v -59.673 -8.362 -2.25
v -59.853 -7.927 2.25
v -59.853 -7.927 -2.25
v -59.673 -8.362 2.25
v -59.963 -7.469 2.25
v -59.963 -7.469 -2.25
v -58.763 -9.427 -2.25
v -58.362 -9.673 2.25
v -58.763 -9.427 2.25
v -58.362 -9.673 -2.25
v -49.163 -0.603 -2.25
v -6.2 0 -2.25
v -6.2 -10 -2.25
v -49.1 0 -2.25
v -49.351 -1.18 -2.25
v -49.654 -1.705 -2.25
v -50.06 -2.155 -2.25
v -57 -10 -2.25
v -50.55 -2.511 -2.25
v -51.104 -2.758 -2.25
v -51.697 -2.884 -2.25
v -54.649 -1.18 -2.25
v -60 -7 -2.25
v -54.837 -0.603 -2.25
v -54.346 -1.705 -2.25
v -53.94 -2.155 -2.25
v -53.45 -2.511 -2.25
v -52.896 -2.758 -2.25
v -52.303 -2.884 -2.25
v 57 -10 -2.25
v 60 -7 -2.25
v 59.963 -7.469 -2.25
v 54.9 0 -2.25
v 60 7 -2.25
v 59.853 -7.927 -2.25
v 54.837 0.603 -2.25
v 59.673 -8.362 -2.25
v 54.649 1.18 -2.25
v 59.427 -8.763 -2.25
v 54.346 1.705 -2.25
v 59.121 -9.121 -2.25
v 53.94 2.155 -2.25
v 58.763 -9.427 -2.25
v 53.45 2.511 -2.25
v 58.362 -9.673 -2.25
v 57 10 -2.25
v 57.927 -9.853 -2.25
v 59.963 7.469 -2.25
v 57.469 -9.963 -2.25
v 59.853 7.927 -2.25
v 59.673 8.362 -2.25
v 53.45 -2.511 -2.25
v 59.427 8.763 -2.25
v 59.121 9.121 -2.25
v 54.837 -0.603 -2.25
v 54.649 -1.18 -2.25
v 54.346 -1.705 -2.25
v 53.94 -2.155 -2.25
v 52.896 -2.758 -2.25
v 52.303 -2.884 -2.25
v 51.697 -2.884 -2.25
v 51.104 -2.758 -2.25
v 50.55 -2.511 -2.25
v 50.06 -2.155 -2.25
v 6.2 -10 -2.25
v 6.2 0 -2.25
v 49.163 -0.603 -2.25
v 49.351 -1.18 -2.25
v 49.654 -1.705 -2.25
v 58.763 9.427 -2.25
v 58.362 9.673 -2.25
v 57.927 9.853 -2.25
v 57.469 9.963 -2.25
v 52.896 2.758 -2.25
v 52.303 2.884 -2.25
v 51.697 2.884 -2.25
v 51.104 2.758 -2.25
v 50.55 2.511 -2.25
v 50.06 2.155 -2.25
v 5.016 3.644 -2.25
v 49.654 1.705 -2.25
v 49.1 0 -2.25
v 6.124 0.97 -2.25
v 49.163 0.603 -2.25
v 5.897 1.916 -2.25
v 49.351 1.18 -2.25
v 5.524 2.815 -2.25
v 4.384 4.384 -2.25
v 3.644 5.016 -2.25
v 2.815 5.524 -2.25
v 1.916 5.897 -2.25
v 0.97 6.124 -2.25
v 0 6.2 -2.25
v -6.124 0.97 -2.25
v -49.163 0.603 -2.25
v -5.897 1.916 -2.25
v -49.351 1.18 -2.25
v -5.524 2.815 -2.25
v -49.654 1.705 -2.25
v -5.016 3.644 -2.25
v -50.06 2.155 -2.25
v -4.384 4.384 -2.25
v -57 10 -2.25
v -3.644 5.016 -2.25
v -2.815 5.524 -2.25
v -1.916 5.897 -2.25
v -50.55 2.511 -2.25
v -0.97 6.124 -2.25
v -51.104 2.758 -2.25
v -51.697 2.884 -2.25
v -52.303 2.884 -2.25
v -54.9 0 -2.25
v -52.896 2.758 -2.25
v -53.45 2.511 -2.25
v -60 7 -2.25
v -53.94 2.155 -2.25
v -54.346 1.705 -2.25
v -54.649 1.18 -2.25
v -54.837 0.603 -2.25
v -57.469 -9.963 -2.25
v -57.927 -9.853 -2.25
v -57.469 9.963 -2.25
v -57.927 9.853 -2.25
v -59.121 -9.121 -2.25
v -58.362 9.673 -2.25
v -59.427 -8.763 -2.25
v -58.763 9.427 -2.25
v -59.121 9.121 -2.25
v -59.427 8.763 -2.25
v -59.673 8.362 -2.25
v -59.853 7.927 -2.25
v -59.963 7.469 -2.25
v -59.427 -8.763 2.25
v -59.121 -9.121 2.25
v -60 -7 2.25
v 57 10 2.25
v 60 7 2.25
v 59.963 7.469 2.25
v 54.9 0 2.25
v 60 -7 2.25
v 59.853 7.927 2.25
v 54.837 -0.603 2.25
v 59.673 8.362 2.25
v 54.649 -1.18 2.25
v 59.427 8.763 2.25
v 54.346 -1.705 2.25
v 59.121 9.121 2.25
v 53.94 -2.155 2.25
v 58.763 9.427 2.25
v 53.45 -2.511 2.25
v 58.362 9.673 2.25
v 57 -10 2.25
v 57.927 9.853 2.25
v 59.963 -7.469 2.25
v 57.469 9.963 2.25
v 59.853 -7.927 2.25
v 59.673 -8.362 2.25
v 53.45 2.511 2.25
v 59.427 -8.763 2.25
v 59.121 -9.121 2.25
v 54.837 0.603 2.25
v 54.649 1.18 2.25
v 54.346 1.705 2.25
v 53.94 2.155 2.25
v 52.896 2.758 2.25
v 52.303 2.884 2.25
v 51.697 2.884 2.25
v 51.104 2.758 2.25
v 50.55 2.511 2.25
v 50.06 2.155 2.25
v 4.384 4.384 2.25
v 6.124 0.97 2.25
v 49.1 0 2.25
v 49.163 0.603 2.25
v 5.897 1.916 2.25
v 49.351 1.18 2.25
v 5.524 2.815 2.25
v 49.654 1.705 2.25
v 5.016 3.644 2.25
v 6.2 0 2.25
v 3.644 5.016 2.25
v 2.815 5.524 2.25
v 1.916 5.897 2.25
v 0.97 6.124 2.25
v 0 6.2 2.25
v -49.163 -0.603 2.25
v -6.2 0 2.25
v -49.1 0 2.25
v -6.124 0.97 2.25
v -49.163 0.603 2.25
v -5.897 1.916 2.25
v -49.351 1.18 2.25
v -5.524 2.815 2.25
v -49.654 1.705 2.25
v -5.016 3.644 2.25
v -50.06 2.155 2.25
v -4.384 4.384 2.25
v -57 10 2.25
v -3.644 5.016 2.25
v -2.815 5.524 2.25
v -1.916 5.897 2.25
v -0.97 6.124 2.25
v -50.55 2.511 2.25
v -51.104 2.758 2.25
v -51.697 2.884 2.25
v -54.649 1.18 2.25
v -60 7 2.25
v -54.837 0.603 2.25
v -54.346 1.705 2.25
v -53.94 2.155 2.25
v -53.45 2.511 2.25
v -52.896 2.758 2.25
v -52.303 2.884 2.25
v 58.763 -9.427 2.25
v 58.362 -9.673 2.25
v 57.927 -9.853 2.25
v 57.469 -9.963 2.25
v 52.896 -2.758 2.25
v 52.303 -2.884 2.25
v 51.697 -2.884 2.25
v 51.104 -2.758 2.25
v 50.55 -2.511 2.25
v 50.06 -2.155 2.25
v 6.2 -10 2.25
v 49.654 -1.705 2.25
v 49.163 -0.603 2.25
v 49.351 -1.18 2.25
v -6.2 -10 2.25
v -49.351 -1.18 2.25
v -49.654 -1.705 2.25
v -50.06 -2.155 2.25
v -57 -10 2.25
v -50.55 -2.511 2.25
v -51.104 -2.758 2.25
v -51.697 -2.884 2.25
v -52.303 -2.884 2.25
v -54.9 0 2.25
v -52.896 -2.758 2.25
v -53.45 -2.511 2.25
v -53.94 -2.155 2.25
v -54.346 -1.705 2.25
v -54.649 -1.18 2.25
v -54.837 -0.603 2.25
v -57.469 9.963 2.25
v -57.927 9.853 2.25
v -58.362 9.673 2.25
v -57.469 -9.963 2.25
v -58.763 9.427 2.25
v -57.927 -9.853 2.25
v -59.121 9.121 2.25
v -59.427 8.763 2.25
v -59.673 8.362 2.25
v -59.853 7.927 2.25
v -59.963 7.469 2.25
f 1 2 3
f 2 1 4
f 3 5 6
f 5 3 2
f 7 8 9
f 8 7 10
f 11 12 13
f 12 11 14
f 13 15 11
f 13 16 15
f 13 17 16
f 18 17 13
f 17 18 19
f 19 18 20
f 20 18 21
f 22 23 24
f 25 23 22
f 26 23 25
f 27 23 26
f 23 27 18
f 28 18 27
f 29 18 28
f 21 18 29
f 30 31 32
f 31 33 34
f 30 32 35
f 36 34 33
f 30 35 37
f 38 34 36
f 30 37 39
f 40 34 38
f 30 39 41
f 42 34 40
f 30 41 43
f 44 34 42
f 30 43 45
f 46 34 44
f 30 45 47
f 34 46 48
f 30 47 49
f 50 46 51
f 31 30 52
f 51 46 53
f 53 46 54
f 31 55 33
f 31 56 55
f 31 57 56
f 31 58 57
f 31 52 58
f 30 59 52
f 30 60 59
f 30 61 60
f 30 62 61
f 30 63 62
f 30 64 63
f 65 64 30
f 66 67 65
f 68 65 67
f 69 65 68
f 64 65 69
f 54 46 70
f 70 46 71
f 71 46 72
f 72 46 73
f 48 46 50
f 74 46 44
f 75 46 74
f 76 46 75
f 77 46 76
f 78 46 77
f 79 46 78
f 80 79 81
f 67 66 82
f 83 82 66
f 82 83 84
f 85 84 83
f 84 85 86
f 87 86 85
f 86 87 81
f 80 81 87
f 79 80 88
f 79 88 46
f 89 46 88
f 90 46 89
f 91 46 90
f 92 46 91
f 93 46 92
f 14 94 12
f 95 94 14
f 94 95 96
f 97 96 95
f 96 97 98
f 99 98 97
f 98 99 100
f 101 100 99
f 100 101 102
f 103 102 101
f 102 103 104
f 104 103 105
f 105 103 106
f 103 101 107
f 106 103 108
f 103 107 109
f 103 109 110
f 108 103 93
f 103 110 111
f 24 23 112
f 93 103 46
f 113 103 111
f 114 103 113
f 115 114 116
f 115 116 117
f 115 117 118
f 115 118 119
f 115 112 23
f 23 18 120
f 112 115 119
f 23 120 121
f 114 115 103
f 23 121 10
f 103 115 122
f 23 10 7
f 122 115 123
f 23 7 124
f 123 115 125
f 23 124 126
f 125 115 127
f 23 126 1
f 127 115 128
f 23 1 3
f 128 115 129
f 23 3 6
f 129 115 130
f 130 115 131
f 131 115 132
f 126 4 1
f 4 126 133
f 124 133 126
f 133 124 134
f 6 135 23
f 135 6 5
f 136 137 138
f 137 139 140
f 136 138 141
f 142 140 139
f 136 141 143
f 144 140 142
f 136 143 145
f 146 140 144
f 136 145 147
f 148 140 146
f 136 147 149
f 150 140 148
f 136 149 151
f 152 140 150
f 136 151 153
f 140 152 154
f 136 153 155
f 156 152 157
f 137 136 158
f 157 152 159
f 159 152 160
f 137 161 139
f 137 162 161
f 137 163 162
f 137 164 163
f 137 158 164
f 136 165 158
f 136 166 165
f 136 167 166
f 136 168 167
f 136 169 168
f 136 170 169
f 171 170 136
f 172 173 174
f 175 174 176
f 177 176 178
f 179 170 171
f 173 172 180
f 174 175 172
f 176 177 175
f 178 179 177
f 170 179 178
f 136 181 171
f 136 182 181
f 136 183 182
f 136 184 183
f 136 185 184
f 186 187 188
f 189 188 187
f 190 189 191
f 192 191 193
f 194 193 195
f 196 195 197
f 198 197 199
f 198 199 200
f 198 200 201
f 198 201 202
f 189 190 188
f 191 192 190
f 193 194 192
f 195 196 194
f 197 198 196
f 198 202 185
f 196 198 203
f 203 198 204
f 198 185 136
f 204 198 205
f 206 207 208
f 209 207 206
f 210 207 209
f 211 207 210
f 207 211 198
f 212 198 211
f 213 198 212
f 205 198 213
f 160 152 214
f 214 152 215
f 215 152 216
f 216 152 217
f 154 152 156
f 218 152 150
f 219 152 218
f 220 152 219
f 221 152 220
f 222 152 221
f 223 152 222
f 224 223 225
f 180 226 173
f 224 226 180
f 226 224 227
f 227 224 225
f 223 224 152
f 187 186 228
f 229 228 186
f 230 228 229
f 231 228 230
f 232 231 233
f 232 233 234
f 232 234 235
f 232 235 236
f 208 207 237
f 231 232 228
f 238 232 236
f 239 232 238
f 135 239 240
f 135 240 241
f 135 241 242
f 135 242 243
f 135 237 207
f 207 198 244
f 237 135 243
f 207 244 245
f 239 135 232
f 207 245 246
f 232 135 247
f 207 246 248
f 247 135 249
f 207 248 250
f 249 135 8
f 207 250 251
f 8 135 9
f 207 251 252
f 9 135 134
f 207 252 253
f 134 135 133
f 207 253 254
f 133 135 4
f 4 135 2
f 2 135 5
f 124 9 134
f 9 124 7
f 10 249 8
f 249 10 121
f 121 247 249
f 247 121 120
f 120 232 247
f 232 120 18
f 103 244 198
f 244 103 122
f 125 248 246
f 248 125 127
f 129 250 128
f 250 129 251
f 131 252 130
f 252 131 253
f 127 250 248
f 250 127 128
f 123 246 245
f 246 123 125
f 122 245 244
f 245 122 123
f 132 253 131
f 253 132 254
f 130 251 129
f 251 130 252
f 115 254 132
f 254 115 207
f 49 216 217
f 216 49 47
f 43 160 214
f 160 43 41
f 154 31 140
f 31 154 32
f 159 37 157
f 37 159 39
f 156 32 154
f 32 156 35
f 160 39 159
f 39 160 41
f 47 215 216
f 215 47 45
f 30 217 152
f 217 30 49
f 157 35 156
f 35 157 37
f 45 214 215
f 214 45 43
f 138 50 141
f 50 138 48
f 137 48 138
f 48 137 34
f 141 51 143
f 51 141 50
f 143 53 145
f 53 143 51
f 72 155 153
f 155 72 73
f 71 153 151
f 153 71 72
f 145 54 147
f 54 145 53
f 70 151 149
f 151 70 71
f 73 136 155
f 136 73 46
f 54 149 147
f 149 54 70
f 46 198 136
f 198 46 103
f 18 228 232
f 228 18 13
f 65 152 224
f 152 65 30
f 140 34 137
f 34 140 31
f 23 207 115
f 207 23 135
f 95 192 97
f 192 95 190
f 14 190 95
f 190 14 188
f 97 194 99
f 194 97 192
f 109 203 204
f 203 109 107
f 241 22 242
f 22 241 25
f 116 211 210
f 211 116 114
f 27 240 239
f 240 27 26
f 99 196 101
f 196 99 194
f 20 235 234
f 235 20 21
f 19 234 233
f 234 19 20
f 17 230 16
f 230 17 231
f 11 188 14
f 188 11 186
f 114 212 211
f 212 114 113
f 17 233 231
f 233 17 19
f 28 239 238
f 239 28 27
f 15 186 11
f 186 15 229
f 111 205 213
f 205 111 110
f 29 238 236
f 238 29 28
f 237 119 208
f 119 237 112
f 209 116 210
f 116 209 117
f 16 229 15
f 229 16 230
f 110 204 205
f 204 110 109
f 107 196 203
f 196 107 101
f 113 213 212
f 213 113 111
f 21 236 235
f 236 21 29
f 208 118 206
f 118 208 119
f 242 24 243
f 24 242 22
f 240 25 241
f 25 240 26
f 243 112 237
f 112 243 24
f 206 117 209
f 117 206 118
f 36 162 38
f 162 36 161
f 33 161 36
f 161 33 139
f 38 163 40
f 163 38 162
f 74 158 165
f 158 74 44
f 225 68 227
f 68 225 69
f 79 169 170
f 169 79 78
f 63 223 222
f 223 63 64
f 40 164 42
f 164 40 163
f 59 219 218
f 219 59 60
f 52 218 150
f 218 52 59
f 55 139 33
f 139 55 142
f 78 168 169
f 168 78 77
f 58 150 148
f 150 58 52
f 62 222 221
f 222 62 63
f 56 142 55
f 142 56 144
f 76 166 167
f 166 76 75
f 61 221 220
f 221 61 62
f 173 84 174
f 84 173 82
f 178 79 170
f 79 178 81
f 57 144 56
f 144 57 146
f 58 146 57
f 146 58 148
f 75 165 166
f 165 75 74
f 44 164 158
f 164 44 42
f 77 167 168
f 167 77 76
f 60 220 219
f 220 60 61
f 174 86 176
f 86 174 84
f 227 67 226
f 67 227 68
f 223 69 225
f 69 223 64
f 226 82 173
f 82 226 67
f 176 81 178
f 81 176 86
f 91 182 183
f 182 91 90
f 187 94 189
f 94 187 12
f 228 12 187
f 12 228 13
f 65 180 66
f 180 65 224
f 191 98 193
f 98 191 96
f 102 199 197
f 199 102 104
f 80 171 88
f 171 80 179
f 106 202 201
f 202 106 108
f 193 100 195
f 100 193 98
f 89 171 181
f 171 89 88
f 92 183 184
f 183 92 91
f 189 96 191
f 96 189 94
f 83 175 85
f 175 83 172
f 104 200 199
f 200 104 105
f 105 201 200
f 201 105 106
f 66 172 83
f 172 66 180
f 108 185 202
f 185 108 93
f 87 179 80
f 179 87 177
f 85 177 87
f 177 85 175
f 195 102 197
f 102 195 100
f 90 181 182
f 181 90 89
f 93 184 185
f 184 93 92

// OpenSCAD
// Thing-O-Matic groovemount

use <MCAD/boxes.scad>;

module groovemount(thickness=4.5,mountingHoleSep=104,mountDiam=12.4){
    union(){
        difference(){
            union(){
                roundedBox([120,20,thickness],3,true,center=false,$fn=40);
            } 
            // mounting holes for M5 screws
            for(i=[-1,1]){
                translate([mountingHoleSep/2*i,0,0]) cylinder(d=5.8,h=thickness+1,$fn=30,center=true);
            }
            // groovemount
            hull(){
              cylinder(d=mountDiam,h=thickness+1,center=true,$fn=40);  
              translate([0,-10,0]) cube([mountDiam,20,thickness+1],center=true);
            }
        }
    }
}

groovemount();
